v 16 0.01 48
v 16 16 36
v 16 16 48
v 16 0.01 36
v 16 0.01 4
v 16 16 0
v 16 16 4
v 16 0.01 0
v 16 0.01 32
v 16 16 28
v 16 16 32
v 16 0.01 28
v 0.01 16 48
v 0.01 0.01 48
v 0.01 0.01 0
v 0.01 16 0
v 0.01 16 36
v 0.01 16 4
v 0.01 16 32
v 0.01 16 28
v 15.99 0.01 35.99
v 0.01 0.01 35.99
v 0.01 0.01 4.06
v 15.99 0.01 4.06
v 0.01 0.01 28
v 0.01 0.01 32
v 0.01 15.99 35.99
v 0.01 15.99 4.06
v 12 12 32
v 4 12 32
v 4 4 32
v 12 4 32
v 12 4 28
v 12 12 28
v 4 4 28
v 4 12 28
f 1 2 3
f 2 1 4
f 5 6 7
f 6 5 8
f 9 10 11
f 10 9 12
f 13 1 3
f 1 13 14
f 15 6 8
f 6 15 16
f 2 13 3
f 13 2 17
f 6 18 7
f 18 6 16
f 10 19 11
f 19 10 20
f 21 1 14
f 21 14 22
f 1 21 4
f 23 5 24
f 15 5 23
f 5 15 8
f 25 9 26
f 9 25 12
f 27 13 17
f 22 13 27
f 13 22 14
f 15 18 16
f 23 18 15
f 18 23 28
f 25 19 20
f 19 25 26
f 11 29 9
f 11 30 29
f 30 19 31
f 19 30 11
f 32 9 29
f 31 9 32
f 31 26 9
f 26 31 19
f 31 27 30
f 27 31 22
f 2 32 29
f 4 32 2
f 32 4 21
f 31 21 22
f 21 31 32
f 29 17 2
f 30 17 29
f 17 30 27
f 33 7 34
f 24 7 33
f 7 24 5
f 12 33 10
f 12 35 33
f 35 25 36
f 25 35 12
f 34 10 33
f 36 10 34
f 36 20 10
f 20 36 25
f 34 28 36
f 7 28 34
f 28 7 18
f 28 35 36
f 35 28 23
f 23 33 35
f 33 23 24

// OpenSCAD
difference () {
cube([16,16,48]);
//clean up
translate([0,0,0])
	cube([16,.01, 48]);
translate([0,16,0])
	cube([16,.01, 48]);
translate([0,0,0])
	cube([.01,16, 48]);
translate([16,0,0])
	cube([.01,16, 48]);

//Creation of the top cut
translate([0,16,32])
	rotate([90,0,0])
	linear_extrude(height =16, center = false, convexity = 10, twist = 0)
	polygon([[0,0],[4,0],[0,4]],[[0,1,2]]);
translate([16,0,32])
	rotate([90,0,180])
	linear_extrude(height =16, center = false, convexity = 10, twist = 0)
	polygon([[0,0],[4,0],[0,4]],[[0,1,2]]);
translate([0,0,32])
	rotate([90,0,90])
	linear_extrude(height =16, center = false, convexity = 10, twist = 0)
	polygon([[0,0],[4,0],[0,4]],[[0,1,2]]);
translate([16,16,32])
	rotate([90,0,270])
	linear_extrude(height =16, center = false, convexity = 10, twist = 0)
	polygon([[0,0],[4,0],[0,4]],[[0,1,2]]);
//Creation of the bottom Cut
translate([16,16,28])
	rotate([90,180,0])
	linear_extrude(height =16, center = false, convexity = 10, twist = 0)
	polygon([[0,24],[0,0],[4,0]],[[0,1,2]]);
translate([0,16,28])
	rotate([90,180,90])
	linear_extrude(height =16, center = false, convexity = 10, twist = 0)
	polygon([[0,24],[0,0],[4,0]],[[0,1,2]]);
translate([0,0,28])
	rotate([90,180,180])
	linear_extrude(height =16, center = false, convexity = 10, twist = 0)
	polygon([[0,24],[0,0],[4,0]],[[0,1,2]]);
translate([16,0,28])
	rotate([90,180,270])
	linear_extrude(height =16, center = false, convexity = 10, twist = 0)
	polygon([[0,24],[0,0],[4,0]],[[0,1,2]]);	
}
